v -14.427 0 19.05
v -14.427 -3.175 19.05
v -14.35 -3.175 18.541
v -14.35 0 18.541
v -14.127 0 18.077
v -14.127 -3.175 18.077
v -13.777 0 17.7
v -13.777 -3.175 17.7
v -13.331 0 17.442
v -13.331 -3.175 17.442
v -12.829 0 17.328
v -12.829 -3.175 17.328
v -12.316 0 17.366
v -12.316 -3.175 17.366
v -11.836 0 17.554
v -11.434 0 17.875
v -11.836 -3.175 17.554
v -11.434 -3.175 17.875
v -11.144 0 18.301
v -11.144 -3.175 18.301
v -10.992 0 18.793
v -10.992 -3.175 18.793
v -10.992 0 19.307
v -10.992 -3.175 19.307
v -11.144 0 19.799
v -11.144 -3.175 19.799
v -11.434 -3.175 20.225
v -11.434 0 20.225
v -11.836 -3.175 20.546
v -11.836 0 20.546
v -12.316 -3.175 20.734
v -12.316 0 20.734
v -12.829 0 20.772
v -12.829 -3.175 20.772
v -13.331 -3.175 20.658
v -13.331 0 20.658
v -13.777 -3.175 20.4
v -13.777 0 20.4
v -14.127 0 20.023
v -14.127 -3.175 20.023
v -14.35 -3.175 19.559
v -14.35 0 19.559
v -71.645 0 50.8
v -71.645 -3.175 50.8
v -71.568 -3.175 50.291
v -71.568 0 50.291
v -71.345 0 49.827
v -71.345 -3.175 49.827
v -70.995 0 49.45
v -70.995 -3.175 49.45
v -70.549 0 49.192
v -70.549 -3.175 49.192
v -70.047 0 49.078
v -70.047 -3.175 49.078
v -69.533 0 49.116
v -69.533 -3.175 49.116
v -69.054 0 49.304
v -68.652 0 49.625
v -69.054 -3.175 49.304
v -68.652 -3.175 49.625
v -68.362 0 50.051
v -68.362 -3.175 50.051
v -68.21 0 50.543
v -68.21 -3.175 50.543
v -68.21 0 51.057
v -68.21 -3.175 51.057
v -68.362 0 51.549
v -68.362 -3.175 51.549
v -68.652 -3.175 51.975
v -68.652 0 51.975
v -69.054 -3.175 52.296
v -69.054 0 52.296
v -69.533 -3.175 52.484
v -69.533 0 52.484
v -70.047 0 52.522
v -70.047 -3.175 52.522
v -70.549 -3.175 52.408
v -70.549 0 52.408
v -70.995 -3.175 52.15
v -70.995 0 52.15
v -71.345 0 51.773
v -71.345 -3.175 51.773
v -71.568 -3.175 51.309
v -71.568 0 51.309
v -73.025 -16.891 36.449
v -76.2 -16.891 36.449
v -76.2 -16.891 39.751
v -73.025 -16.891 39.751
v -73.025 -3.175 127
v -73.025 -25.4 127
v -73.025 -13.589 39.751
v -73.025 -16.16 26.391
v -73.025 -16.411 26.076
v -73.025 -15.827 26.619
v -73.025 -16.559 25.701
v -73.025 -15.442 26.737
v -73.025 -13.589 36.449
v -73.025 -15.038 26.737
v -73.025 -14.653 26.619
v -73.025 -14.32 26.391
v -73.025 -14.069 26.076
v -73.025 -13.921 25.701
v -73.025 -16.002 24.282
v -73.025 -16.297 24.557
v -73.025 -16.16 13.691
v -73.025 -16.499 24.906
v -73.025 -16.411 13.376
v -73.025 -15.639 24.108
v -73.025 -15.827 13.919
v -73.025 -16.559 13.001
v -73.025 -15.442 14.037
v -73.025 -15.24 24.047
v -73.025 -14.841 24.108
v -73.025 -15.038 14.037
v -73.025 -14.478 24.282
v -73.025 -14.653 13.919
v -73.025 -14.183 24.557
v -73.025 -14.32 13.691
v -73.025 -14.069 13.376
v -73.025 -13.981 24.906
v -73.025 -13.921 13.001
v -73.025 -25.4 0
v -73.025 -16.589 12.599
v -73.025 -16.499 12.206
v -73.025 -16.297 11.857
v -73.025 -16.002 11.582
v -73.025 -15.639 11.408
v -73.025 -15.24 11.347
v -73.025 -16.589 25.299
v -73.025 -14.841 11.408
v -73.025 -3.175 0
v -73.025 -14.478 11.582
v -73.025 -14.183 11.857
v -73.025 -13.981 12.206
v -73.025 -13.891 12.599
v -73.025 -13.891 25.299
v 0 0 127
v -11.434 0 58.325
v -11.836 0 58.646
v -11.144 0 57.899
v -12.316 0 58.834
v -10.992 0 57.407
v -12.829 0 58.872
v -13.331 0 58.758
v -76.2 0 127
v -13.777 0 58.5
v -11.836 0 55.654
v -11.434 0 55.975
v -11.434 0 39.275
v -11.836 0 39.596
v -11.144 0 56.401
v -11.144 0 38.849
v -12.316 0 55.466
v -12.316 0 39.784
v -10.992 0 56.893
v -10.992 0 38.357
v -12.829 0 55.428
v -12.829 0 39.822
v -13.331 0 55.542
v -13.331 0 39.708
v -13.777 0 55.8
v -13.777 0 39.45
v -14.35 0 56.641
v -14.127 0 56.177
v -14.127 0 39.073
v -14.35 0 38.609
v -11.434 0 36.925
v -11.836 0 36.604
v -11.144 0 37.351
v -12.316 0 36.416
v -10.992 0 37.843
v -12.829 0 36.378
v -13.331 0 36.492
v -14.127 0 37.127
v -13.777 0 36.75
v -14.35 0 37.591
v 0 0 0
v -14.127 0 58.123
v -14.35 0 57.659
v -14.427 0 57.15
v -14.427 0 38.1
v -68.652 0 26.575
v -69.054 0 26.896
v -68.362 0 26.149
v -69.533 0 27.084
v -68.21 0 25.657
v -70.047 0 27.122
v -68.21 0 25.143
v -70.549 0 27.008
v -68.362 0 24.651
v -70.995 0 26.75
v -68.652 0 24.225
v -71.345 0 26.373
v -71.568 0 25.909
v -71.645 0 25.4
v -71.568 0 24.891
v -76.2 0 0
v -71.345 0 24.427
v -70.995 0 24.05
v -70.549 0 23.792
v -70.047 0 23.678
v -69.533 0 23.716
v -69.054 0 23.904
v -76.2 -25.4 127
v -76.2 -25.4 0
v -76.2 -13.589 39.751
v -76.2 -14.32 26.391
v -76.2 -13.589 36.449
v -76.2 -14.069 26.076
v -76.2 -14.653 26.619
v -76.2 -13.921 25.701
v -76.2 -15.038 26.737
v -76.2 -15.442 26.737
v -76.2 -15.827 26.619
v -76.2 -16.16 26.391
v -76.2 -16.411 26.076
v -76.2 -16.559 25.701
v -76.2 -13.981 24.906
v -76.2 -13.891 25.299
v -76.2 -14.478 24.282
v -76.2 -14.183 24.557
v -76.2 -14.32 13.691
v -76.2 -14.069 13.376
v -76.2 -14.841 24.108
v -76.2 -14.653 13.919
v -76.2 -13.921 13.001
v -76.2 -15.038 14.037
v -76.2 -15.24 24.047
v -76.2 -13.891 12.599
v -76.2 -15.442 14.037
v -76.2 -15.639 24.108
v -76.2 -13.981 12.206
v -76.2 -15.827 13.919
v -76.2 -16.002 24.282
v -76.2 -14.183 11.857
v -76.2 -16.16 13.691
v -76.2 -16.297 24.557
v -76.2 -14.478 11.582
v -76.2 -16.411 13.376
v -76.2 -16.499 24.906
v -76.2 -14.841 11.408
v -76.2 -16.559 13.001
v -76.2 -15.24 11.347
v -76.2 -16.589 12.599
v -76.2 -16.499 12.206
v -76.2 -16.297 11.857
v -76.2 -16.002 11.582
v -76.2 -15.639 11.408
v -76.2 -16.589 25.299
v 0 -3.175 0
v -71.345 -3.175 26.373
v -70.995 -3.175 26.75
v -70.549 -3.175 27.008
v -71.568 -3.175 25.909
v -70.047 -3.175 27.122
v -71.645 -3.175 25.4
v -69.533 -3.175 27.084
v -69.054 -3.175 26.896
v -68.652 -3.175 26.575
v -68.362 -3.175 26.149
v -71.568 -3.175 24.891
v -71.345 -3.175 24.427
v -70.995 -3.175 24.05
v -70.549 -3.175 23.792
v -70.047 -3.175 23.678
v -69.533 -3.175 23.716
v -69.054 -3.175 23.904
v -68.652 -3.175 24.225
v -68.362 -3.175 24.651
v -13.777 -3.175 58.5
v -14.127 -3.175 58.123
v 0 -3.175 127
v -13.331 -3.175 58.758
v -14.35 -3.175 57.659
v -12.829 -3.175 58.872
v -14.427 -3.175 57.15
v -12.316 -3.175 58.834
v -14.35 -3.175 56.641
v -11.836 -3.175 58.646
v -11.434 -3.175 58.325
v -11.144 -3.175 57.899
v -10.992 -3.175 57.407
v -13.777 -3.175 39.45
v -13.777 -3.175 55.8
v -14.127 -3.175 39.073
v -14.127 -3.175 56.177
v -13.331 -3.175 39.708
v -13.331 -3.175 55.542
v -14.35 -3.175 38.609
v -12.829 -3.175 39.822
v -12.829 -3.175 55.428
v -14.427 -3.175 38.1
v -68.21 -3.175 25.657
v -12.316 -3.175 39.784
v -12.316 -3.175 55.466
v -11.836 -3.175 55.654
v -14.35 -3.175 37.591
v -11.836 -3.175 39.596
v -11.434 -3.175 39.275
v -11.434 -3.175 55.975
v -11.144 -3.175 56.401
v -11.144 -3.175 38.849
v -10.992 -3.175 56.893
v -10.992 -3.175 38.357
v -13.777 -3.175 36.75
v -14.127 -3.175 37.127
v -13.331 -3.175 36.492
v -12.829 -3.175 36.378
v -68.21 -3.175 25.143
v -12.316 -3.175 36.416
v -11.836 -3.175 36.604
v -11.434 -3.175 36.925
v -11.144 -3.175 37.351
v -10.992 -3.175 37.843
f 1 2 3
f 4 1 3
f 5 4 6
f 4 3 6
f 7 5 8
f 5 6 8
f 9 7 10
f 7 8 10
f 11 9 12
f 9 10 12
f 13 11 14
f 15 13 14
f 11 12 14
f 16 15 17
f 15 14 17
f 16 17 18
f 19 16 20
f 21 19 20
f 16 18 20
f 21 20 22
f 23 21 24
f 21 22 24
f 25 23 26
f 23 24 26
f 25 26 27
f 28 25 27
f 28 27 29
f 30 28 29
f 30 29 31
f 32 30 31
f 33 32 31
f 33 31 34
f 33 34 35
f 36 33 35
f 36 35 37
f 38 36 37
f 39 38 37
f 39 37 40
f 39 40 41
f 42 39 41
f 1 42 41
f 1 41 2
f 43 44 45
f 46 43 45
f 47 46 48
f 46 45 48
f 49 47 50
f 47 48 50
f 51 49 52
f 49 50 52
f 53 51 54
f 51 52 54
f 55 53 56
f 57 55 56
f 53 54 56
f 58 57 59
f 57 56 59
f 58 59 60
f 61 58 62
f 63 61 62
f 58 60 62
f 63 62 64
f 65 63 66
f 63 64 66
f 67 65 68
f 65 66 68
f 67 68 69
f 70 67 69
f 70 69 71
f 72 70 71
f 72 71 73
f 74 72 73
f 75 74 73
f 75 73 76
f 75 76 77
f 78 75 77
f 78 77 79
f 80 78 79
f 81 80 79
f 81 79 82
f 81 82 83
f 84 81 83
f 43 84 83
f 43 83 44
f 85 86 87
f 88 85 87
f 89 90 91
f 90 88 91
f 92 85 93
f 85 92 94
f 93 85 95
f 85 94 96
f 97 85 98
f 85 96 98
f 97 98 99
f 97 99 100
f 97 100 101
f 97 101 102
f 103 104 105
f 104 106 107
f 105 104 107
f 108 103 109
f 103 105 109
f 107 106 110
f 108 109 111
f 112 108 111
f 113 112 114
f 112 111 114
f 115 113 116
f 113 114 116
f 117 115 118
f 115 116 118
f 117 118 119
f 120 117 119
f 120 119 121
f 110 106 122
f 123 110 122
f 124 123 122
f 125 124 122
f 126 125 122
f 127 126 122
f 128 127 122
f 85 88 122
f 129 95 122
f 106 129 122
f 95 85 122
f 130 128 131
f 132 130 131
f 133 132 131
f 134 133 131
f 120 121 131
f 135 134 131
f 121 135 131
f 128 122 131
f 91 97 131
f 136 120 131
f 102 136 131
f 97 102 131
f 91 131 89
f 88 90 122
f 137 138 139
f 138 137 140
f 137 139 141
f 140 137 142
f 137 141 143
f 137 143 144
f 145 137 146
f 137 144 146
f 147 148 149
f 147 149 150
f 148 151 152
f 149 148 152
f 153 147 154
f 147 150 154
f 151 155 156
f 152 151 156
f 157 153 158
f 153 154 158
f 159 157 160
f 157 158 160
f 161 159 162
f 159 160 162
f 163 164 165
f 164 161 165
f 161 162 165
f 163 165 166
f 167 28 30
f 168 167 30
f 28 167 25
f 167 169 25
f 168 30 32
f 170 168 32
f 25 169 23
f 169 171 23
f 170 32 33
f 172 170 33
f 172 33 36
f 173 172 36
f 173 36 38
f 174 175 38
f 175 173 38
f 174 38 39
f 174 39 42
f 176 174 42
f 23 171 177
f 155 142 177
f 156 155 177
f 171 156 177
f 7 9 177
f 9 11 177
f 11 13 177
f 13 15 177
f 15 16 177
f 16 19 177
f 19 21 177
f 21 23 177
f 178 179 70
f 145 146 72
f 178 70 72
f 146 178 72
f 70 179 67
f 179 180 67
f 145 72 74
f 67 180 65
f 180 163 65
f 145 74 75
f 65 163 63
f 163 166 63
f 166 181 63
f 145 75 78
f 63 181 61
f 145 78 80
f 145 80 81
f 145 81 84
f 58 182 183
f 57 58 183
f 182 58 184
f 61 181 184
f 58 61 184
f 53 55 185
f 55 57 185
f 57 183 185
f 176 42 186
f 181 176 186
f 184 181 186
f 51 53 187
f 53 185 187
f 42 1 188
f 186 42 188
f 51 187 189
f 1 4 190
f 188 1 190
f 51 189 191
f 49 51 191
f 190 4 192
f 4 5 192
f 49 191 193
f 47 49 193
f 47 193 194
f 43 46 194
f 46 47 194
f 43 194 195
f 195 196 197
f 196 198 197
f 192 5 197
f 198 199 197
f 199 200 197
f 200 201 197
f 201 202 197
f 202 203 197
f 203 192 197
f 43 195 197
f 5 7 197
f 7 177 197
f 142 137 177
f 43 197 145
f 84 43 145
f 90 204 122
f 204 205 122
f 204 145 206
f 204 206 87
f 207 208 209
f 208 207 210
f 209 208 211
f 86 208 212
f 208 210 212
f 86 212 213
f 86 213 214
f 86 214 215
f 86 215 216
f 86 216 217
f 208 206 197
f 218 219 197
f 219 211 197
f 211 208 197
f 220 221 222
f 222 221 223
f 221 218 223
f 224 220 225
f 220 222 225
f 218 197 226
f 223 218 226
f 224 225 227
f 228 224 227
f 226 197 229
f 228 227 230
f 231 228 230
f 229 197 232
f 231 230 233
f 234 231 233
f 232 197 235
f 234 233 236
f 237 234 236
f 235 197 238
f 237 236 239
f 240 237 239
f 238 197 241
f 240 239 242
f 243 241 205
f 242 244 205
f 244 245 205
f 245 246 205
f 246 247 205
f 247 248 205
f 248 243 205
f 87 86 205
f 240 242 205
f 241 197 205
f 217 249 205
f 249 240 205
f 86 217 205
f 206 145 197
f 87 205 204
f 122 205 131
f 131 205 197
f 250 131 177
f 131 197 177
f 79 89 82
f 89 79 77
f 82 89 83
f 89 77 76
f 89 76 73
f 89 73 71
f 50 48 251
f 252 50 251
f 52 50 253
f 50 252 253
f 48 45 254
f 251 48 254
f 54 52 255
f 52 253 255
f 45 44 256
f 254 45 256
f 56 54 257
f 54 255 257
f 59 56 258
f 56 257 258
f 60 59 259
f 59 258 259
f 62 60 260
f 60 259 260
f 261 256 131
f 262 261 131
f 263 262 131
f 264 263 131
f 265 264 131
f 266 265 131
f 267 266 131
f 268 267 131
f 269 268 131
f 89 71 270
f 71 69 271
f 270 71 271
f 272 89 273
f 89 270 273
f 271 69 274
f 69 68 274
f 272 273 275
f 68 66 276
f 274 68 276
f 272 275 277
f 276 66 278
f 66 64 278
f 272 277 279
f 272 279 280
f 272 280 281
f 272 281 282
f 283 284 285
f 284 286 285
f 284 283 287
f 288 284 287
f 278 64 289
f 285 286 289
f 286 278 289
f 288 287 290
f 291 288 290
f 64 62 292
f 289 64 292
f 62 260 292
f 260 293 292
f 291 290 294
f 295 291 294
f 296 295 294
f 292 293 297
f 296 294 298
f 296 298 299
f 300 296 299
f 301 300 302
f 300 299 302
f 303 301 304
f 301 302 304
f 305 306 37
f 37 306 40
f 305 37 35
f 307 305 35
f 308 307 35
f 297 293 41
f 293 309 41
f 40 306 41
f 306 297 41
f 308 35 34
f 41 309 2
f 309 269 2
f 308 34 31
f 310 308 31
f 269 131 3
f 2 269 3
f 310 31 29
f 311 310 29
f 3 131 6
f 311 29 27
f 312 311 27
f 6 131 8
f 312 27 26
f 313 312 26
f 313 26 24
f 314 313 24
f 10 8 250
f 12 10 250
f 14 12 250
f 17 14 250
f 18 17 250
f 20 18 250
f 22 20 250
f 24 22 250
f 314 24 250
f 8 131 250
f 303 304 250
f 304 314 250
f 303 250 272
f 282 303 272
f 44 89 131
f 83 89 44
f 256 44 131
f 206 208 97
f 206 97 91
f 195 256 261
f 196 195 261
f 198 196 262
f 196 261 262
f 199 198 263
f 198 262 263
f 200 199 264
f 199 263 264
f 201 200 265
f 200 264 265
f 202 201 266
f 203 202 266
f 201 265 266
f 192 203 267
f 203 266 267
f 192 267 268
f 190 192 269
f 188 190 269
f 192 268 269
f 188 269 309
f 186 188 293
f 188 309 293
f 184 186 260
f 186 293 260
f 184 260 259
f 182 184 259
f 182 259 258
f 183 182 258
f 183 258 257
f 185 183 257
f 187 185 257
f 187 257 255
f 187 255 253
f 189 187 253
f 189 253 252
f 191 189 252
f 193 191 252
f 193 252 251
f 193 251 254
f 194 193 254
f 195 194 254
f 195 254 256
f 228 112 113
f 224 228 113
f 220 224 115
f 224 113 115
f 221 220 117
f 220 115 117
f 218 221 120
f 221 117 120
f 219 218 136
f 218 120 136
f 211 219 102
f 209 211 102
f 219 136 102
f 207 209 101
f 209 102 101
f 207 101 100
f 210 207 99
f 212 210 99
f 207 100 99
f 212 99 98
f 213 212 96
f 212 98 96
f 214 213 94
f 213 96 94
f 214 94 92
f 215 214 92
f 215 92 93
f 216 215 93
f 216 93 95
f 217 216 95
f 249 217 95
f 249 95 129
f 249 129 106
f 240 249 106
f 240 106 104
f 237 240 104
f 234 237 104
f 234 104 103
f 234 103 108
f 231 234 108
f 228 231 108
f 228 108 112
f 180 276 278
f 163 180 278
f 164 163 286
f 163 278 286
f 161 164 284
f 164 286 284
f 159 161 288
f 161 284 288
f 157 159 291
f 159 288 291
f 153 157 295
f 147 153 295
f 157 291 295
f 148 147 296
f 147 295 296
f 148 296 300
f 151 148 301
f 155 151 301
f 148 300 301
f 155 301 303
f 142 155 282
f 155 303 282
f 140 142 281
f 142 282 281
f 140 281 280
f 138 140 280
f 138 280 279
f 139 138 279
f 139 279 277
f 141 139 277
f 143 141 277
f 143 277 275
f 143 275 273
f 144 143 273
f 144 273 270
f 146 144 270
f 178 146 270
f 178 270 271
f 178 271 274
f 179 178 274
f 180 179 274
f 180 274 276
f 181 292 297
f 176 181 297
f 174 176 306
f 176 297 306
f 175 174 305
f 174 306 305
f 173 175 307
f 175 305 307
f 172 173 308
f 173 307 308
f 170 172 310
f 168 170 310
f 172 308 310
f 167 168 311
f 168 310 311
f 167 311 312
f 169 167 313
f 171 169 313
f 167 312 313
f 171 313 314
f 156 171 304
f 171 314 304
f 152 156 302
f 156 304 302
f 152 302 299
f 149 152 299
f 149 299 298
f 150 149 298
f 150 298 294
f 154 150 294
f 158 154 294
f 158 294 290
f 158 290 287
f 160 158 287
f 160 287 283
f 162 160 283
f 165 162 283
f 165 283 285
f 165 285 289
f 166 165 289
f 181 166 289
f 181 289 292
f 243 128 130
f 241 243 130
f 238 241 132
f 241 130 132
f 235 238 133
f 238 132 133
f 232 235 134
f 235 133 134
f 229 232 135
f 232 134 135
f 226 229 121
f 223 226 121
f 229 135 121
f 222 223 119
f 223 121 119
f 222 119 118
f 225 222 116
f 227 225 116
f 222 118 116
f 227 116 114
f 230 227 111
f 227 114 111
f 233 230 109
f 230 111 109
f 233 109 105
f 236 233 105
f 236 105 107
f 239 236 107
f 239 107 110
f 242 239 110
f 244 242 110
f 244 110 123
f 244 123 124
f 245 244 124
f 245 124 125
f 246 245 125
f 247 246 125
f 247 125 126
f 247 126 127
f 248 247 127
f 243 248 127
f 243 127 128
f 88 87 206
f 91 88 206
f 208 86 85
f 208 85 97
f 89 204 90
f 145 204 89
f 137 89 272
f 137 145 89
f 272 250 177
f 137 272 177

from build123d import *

# Parameters (mm, degrees)
BOSS_EXTRUDE1_DEPTH       = 76.2
TAP_DRILL_FOR_6_32_TAP1_D = 2.7051
TAP_DRILL_FOR_8_32_TAP1_D = 3.4544
CUT_EXTRUDE1_REACH        = 112.716
SKETCH8_W                 = 3.302
SKETCH8_H                 = 3.302
TAP_DRILL_FOR_8_32_TAP2_D = 3.4544
BOSS_EXTRUDE2_DEPTH       = 50.8


with BuildPart() as part:
    # Sketch2 → Boss-Extrude1 (new body)
    with BuildSketch(Plane.XY):
        Polygon((0, 0), (-76.2, 0), (-76.2, -25.4), (-73.025, -25.4), (-73.025, -3.175), (0, -3.175), align=None)
    extrude(amount=BOSS_EXTRUDE1_DEPTH)

    # Tap Drill for #6-32 Tap1 (through all)
    with Locations(Plane.ZY.offset(76.2)):
        with Locations((25.4, -15.24), (12.7, -15.24)):
            Hole(TAP_DRILL_FOR_6_32_TAP1_D / 2)

    # Tap Drill for #8-32 Tap1 (through all)
    with Locations(Plane(origin=(0, 0, 0), x_dir=(1, 0, 0), z_dir=(0, 1, 0))):
        with Locations((-69.917738612, -25.4), (-69.917738612, -50.8)):
            Hole(TAP_DRILL_FOR_8_32_TAP1_D / 2)

    # Sketch8 → Cut-Extrude1 (cut, up to next)
    with BuildSketch(Plane.ZY.offset(76.2), mode=Mode.PRIVATE) as cut_extrude1_sk1:
        with Locations((38.1, -15.24)):
            Rectangle(SKETCH8_W, SKETCH8_H)
    cut_extrude1_tool1 = extrude(cut_extrude1_sk1.sketch, amount=-CUT_EXTRUDE1_REACH, mode=Mode.PRIVATE) & part.part
    add(cut_extrude1_tool1.solids().sort_by_distance((-76.2, -15.24, 38.1))[0], mode=Mode.SUBTRACT)

    # Tap Drill for #8-32 Tap2 (through all)
    with Locations(Plane(origin=(0, 0, 0), x_dir=(1, 0, 0), z_dir=(0, 1, 0))):
        with Locations((-12.7, -19.05), (-12.7, -38.1), (-12.7, -57.15)):
            Hole(TAP_DRILL_FOR_8_32_TAP2_D / 2)

    # Sketch11 → Boss-Extrude2 (add)
    with BuildSketch(Plane.XY.offset(76.2)):
        Polygon((-76.2, 0), (-76.2, -25.4), (-73.025, -25.4), (-73.025, -3.175), (0, -3.175), (0, 0), align=None)
    extrude(amount=BOSS_EXTRUDE2_DEPTH)


solid = part.part
